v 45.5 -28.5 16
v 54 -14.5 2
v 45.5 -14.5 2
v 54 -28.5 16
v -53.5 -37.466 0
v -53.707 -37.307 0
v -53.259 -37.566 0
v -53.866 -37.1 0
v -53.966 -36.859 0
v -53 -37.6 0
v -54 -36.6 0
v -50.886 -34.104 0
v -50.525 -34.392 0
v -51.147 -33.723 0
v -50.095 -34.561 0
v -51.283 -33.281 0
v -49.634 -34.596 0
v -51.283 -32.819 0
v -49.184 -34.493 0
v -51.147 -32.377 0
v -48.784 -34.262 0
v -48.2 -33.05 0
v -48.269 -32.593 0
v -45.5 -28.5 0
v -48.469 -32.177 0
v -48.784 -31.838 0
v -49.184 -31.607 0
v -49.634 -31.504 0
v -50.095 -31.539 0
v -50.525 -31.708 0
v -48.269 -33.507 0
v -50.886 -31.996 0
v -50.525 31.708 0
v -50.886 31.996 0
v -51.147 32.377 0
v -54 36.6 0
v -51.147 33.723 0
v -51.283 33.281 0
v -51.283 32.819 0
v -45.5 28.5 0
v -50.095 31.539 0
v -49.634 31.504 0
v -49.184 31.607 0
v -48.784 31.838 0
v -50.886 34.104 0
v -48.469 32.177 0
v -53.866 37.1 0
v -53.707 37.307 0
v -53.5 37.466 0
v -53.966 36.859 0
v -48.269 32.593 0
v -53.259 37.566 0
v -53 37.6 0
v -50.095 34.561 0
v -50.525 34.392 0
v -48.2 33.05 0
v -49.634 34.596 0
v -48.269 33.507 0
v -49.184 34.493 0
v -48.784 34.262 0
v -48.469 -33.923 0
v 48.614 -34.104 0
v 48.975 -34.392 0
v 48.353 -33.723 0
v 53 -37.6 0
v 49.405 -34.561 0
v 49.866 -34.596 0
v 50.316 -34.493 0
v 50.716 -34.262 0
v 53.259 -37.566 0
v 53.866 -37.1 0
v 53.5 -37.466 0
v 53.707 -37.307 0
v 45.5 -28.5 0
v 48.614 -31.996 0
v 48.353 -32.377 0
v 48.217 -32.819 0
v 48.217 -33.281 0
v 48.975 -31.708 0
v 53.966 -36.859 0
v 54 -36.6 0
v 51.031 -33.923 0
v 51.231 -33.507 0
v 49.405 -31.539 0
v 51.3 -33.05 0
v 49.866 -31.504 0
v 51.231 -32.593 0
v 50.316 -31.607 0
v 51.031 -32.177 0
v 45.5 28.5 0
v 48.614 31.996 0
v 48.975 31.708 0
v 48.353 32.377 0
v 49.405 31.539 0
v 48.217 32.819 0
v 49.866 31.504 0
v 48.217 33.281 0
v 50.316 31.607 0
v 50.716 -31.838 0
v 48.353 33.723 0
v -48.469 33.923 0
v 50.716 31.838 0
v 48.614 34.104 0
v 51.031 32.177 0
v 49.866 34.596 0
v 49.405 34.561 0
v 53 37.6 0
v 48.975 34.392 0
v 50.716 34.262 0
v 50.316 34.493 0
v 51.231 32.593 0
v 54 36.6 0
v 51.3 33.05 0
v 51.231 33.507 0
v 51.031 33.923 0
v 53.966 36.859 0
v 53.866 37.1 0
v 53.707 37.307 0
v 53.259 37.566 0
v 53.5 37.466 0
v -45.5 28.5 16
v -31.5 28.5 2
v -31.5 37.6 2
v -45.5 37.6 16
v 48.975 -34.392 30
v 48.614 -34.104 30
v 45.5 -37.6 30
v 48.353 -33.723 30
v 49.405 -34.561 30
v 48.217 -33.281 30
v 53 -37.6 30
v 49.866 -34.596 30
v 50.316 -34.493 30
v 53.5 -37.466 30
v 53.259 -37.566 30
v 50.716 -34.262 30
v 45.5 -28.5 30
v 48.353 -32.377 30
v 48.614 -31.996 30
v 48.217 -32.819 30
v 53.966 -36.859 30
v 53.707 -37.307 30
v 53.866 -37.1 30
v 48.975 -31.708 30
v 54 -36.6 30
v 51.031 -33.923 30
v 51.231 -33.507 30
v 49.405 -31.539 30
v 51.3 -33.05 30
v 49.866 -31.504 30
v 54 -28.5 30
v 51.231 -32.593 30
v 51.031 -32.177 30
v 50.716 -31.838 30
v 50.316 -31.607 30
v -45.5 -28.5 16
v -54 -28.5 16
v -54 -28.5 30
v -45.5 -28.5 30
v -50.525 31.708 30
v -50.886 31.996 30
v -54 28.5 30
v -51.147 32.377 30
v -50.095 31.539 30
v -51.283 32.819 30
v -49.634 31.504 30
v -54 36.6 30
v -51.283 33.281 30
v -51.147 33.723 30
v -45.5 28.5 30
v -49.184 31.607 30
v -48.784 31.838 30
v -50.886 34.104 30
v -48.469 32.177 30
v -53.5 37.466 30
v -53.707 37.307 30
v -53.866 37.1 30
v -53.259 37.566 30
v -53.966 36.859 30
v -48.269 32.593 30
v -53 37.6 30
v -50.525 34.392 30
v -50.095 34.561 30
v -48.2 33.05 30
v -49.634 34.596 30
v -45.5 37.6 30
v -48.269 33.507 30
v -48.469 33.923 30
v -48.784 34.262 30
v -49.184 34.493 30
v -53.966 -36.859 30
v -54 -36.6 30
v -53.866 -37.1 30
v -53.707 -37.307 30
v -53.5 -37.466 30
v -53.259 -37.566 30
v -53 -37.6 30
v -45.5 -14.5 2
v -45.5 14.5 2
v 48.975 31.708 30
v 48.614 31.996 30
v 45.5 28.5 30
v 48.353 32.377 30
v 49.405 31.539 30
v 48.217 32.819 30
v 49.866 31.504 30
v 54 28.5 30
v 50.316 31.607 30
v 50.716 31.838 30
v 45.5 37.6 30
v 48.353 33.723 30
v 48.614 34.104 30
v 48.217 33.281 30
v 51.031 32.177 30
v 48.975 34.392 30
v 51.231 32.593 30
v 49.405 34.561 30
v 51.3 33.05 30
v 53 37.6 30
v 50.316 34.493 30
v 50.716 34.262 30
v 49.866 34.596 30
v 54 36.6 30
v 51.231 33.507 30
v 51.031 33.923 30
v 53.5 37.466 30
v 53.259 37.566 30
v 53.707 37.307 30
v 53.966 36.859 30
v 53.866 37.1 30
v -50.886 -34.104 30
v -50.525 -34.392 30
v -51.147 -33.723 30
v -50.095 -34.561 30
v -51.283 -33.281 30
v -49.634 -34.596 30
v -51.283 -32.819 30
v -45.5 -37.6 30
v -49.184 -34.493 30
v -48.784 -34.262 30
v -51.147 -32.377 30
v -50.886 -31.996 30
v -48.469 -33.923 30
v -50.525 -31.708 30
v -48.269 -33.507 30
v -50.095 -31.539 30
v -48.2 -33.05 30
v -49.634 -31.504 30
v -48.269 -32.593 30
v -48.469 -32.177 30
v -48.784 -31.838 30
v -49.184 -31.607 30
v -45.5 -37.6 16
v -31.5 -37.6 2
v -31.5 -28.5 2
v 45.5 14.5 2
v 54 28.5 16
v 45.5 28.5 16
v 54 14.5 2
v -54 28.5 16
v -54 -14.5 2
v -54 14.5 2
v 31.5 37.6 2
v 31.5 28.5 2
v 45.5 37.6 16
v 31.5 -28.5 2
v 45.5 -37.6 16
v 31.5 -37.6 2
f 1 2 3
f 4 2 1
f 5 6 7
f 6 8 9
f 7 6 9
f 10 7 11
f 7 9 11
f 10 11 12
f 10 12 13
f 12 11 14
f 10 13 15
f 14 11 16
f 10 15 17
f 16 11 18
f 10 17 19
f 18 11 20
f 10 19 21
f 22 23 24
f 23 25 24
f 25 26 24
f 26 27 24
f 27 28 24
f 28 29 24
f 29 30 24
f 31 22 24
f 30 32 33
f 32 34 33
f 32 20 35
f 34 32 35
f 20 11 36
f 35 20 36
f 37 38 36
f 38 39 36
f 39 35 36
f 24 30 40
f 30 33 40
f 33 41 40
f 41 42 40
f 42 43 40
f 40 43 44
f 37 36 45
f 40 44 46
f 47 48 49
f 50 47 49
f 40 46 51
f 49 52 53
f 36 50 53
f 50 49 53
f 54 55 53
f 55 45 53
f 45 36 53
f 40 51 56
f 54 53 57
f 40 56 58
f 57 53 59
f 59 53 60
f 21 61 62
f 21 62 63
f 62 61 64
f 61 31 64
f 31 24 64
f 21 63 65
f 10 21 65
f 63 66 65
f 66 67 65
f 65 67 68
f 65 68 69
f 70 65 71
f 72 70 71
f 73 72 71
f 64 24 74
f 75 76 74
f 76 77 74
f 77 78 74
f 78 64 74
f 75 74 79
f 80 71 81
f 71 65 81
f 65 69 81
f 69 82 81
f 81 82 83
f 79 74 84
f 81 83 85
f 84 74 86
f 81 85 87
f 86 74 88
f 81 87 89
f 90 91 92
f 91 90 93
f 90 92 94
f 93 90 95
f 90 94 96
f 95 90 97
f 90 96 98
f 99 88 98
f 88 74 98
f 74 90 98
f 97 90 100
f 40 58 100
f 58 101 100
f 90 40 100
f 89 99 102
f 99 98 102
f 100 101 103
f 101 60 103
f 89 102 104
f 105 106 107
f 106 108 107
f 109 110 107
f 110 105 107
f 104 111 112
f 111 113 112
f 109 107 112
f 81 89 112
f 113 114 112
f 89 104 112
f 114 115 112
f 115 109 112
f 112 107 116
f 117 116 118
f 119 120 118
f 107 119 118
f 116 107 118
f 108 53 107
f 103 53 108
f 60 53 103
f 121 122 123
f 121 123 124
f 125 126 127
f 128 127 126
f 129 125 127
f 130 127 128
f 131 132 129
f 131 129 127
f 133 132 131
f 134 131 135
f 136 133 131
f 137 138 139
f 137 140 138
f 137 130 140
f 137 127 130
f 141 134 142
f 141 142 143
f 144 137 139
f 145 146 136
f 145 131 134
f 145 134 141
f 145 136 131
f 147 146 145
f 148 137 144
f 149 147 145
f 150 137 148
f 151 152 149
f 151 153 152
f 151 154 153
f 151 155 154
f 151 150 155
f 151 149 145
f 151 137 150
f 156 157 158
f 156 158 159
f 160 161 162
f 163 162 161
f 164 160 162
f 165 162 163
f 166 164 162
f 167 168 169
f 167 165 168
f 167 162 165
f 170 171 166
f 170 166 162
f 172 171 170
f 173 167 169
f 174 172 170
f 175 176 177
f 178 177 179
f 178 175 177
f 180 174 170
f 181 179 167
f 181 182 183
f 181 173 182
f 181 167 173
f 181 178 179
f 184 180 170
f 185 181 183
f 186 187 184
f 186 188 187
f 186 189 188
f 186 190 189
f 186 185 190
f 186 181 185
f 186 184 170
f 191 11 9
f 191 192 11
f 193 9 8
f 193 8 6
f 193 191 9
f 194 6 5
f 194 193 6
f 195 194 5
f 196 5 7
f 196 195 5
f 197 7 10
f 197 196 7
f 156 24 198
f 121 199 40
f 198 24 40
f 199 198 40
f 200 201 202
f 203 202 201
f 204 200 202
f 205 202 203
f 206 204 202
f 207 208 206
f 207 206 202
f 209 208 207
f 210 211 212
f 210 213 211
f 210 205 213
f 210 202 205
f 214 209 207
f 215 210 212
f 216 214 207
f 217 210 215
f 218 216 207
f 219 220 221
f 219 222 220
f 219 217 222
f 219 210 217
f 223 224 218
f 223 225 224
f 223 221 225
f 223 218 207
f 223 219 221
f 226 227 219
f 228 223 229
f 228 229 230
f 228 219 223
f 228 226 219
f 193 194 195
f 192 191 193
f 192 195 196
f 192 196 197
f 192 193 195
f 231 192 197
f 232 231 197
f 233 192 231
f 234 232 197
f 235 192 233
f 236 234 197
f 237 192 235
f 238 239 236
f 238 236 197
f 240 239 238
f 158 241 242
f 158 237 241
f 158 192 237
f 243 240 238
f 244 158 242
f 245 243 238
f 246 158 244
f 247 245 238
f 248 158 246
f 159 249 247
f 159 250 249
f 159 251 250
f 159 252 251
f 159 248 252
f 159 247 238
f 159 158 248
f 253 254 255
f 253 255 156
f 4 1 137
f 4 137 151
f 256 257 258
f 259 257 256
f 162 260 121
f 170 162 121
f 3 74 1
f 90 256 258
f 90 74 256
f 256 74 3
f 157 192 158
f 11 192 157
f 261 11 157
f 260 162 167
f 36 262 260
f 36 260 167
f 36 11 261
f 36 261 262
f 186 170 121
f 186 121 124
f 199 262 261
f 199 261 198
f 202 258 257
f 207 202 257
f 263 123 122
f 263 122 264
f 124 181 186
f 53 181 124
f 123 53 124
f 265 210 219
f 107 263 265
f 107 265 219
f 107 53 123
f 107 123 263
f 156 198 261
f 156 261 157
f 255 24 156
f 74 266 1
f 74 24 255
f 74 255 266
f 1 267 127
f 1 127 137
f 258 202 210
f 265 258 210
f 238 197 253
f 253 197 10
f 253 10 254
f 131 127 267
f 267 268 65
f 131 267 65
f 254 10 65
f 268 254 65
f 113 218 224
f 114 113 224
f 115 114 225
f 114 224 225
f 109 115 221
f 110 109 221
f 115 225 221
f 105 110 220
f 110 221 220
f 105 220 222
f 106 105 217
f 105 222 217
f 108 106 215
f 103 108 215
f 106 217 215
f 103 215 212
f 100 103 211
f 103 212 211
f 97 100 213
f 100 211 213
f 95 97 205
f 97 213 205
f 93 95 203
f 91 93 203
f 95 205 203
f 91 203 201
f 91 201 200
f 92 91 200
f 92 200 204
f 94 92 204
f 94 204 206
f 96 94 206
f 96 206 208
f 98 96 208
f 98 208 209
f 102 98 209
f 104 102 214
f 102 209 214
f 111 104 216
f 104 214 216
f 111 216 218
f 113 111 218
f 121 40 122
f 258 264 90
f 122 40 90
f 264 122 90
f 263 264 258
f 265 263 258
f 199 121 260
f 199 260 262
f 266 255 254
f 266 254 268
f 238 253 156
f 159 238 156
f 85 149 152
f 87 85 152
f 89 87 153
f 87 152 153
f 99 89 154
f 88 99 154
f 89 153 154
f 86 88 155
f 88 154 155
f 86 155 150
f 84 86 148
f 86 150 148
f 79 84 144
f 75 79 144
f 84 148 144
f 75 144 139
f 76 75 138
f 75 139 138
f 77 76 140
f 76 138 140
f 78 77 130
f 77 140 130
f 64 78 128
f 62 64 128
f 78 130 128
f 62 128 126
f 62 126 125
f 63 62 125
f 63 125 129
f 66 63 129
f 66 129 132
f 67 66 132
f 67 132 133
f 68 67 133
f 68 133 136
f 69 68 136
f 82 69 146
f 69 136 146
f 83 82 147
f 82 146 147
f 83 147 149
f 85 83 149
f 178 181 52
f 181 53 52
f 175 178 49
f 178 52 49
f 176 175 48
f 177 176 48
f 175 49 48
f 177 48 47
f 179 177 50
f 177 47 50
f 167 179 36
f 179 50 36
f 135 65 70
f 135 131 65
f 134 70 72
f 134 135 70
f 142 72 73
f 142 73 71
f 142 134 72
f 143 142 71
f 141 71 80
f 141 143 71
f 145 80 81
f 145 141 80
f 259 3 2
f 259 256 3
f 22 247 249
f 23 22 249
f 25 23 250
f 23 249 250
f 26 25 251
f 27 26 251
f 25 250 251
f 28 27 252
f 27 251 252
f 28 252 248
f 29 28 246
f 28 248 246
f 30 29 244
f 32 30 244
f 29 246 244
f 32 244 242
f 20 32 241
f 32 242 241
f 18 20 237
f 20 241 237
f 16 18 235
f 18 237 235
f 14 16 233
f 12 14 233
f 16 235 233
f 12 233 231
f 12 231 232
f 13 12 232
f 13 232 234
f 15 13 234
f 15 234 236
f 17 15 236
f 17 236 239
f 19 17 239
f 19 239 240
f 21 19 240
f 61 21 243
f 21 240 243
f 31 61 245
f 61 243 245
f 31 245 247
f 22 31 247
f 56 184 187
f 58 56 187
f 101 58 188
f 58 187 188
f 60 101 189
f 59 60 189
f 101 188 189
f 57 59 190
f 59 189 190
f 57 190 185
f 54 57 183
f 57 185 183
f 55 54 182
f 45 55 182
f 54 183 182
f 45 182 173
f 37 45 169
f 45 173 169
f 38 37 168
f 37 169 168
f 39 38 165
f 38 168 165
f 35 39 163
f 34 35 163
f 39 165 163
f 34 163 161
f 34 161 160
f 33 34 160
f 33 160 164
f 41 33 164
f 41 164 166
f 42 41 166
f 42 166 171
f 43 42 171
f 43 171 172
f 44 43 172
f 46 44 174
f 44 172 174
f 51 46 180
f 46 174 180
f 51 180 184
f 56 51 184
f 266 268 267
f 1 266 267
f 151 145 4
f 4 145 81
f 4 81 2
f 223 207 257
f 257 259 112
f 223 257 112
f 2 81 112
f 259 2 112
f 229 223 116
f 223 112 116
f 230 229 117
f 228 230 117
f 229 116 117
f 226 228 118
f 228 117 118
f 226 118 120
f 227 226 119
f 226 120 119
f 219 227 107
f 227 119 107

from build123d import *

# Parameters (mm, degrees)
SKETCH_W        = 108
SKETCH_H        = 75.2
SKETCH_W_2      = 91
SKETCH_H_2      = 57
PAD_DEPTH       = 2
PAD001_DEPTH    = 14
POCKET_DEPTH    = 75.2
POCKET001_DEPTH = 108
SKETCH004_W     = 8.5
SKETCH004_H     = 9.1
PAD002_DEPTH    = 14
SKETCH005_R     = 1.55
POCKET002_DEPTH = 30
FILLET_R        = 1
FILLET001_R     = 1
FILLET002_R     = 1
FILLET003_R     = 1


with BuildPart() as part:
    # Sketch → Pad (new body)
    with BuildSketch(Plane.XY):
        Rectangle(SKETCH_W, SKETCH_H)
        Rectangle(SKETCH_W_2, SKETCH_H_2, mode=Mode.SUBTRACT)
    extrude(amount=PAD_DEPTH)

    # Sketch001 (on Face10 of Pad) → Pad001 (join)
    with BuildSketch(Plane.XY.offset(2)):
        Polygon((-54, 37.6), (-54, 14.5), (-45.5, 14.5), (-45.5, 28.5), (-31.5, 28.5), (-31.5, 37.6), align=None)
        Polygon((31.5, 37.6), (54, 37.6), (54, 14.5), (45.5, 14.5), (45.5, 28.5), (31.5, 28.5), align=None)
        Polygon((45.5, -14.5), (45.5, -28.5), (31.5, -28.5), (31.5, -37.6), (54, -37.6), (54, -14.5), align=None)
        Polygon((-31.5, -28.5), (-45.5, -28.5), (-45.5, -14.5), (-54, -14.5), (-54, -37.6), (-31.5, -37.6), align=None)
    extrude(amount=PAD001_DEPTH)

    # Sketch002 (on Face25 of Pad001) → Pocket (cut)
    with BuildSketch(Plane.XZ.offset(37.6)):
        Polygon((-45.5, 16), (-31.5, 16), (-31.5, 2), align=None)
        Polygon((31.5, 16), (31.5, 2), (45.5, 16), align=None)
    extrude(amount=-POCKET_DEPTH, mode=Mode.SUBTRACT)

    # Sketch003 (on Face14 of Pocket) → Pocket001 (cut)
    with BuildSketch(Plane.YZ.offset(54)):
        Polygon((-28.5, 16), (-14.5, 16), (-14.5, 2), align=None)
        Polygon((14.5, 2), (14.5, 16), (28.5, 16), align=None)
    extrude(amount=-POCKET001_DEPTH, mode=Mode.SUBTRACT)

    # Sketch004 (on Face26 of Pocket001) → Pad002 (join)
    with BuildSketch(Plane.XY.offset(16)):
        with Locations((-49.75, 33.05)):
            Rectangle(SKETCH004_W, SKETCH004_H)
        with Locations((49.75, 33.05)):
            Rectangle(SKETCH004_W, SKETCH004_H)
        with Locations((49.75, -33.05)):
            Rectangle(SKETCH004_W, SKETCH004_H)
        with Locations((-49.75, -33.05)):
            Rectangle(SKETCH004_W, SKETCH004_H)
    extrude(amount=PAD002_DEPTH)

    # Sketch005 (on Face51 of Pad002) → Pocket002 (cut)
    with BuildSketch(Plane.XY.offset(30)):
        with Locations((-49.75, 33.05)):
            Circle(SKETCH005_R)
        with Locations((49.75, 33.05)):
            Circle(SKETCH005_R)
        with Locations((49.75, -33.05)):
            Circle(SKETCH005_R)
        with Locations((-49.75, -33.05)):
            Circle(SKETCH005_R)
    extrude(amount=-POCKET002_DEPTH, mode=Mode.SUBTRACT)

    # Fillet
    fillet_edges = [part.edges().sort_by_distance(p)[0] for p in [
        (-54, -37.6, 23),
    ]]
    fillet(fillet_edges, radius=FILLET_R)

    # Fillet001
    fillet001_edges = [part.edges().sort_by_distance(p)[0] for p in [
        (54, -37.6, 23),
    ]]
    fillet(fillet001_edges, radius=FILLET001_R)

    # Fillet002
    fillet002_edges = [part.edges().sort_by_distance(p)[0] for p in [
        (54, 37.6, 9),
    ]]
    fillet(fillet002_edges, radius=FILLET002_R)

    # Fillet003
    fillet003_edges = [part.edges().sort_by_distance(p)[0] for p in [
        (-54, 37.6, 23),
    ]]
    fillet(fillet003_edges, radius=FILLET003_R)


solid = part.part
